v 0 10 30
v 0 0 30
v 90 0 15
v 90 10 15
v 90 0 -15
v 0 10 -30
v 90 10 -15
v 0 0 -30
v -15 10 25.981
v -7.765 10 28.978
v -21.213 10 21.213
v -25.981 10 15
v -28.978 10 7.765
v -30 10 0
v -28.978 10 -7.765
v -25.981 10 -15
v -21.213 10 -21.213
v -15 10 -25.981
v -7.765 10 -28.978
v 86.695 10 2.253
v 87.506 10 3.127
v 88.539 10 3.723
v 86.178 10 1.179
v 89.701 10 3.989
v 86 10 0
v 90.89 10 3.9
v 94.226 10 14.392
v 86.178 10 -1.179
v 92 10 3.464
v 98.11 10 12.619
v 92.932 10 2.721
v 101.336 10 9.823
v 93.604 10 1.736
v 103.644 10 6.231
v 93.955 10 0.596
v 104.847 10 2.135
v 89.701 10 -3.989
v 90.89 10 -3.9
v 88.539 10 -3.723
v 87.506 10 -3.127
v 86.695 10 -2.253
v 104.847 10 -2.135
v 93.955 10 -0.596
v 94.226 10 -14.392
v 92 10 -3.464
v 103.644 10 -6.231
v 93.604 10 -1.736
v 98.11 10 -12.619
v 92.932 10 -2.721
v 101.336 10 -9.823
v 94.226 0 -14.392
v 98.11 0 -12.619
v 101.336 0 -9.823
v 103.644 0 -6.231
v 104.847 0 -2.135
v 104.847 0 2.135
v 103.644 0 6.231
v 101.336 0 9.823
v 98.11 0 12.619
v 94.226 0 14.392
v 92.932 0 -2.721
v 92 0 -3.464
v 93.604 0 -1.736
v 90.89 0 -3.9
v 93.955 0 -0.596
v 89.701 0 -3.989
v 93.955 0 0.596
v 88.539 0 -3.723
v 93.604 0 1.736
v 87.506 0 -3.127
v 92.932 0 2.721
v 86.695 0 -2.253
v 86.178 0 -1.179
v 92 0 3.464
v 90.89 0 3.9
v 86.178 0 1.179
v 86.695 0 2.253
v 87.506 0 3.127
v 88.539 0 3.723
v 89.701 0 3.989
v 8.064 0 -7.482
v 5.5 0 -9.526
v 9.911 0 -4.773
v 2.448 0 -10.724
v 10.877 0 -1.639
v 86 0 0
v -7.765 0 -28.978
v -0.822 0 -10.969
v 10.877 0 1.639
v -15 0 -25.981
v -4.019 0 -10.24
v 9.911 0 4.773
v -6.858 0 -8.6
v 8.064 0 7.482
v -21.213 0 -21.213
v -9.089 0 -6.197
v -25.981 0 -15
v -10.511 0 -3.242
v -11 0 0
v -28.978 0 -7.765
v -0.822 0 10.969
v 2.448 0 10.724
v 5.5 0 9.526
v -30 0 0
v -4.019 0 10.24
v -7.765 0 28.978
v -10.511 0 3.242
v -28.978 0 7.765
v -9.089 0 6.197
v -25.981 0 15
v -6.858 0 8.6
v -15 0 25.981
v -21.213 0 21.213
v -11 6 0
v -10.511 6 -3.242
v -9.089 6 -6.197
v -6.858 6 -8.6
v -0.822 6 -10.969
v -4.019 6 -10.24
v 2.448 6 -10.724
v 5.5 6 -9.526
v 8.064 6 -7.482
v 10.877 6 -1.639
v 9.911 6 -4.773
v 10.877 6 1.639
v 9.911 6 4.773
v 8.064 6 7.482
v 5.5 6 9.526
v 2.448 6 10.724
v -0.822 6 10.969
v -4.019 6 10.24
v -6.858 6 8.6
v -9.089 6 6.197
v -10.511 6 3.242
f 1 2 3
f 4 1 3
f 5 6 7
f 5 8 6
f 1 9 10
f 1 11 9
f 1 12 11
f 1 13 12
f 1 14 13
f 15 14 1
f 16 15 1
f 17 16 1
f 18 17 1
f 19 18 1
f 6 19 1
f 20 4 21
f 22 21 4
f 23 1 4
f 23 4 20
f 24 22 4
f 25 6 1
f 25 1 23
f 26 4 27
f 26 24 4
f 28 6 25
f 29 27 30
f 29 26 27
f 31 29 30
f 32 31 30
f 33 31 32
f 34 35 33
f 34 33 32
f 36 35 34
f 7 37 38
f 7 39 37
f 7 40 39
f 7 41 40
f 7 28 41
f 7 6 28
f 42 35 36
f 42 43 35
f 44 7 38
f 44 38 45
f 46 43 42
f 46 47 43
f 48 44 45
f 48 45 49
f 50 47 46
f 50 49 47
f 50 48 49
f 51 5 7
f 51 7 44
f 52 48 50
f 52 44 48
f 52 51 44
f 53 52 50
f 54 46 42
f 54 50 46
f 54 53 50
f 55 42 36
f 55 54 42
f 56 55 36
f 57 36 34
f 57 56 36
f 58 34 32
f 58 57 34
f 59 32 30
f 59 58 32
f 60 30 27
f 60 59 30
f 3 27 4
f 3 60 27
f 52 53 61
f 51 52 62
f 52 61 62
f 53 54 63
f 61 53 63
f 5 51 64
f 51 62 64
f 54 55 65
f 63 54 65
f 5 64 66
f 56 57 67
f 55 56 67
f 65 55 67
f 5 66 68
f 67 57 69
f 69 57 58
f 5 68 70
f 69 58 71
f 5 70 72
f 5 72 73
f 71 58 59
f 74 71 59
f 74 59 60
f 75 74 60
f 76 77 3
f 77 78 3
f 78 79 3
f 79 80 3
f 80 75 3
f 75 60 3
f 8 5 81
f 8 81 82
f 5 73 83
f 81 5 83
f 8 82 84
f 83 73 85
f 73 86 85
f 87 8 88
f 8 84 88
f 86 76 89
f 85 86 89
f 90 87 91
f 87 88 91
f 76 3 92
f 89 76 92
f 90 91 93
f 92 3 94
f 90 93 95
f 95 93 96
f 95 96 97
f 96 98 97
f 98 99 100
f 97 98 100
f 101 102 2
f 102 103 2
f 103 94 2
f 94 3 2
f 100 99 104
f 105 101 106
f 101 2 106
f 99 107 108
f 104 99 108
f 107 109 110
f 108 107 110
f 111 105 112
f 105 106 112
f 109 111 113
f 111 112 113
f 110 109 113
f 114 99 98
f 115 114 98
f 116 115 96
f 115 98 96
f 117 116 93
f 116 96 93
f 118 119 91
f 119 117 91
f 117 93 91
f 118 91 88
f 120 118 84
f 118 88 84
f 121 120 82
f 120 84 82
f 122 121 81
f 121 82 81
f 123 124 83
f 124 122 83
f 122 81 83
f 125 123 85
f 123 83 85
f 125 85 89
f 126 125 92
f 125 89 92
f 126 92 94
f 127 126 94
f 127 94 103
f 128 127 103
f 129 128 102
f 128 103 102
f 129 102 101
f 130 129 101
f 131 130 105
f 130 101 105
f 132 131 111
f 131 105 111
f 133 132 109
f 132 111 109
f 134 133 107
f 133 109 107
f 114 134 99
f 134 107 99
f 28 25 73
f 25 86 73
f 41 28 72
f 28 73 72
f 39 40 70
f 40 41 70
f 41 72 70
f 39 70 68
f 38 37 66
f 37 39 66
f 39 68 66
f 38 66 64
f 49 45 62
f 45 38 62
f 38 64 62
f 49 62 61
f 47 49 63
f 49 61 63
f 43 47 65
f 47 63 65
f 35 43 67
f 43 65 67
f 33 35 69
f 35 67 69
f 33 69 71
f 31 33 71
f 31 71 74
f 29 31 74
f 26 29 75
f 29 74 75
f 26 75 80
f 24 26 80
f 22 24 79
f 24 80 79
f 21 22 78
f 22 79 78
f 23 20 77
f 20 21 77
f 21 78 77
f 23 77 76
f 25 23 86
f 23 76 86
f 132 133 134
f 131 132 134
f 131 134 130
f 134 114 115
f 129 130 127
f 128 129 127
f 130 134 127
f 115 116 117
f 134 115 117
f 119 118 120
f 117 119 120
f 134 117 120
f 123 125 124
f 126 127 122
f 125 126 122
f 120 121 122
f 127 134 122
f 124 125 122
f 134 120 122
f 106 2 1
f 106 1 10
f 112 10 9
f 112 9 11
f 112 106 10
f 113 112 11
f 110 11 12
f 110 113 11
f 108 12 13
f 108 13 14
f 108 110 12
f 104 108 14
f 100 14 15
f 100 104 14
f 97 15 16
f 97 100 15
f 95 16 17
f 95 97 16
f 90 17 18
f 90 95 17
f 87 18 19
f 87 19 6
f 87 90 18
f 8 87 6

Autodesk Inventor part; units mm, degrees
ref_plane "YZ Plane" through (0, 0, 0) normal (1, 0, 0) x (0, 1, 0)
ref_plane "XZ Plane" through (0, 0, 0) normal (0, 1, 0) x (-1, 0, 0)
ref_plane "XY Plane" through (0, 0, 0) normal (0, 0, 1) x (1, 0, 0)
sketch "Sketch1" plane through (0, 0, 0) normal (0, 1, 0) x (-1, 0, 0)
  circle A0 centre (0, 0) radius 22
  circle A1 centre (0, -22) radius 1.55
  circle A2 centre (0, -22) radius 3
  circle A3 centre (22, 0) radius 3
  circle A4 centre (22, 0) radius 1.55
  circle A5 centre (0, 22) radius 3
  circle A6 centre (0, 22) radius 1.55
  circle A7 centre (-22, 0) radius 3
  circle A8 centre (-22, 0) radius 1.55
  circle A9 centre (0, 0) radius 30
  circle A10 centre (-90, 0) radius 4
  circle A11 centre (-90, 0) radius 15
  line L0 (0, -30) -> (-90, -15)
  line L1 (0, 30) -> (-90, 15)
  circle A12 centre (0, 0) radius 5
  circle A13 centre (0, 0) radius 11
  dimension "d2" = 44
  dimension "d3" = 3.1
  dimension "d4" = 6
  dimension "d5" = 360
  dimension "d6" = 60
  dimension "d8" = 8
  dimension "d9" = 30
  dimension "d10" = 10
  dimension "d11" = 22
extrude "Extrusion1" add sketch "Sketch1" along normal blind 10 contours A0 A4 | A0 A4 | A4 A0 A3 | A0 A3 A4 | A3 A0 A2 A7 A5 | A5 A0 A6 | A0 A6 A5 | A2 A0 A1 | A0 A1 A2 | A6 A0 | A0 A6 | A1 A0 | A0 A1 | A7 A0 A8 | A0 A8 A7 | A8 A0 | A0 A8 | A9 L0 L1 | A9 L0 A11 L1 | A11
sketch "Sketch2" plane through (0, 10, 0) normal (0, 1, 0) x (1, 0, 0)
  circle A0 centre (0, 0) radius 11
  dimension "d14" = 22
extrude "Extrusion2" add sketch "Sketch2" against normal blind 4
